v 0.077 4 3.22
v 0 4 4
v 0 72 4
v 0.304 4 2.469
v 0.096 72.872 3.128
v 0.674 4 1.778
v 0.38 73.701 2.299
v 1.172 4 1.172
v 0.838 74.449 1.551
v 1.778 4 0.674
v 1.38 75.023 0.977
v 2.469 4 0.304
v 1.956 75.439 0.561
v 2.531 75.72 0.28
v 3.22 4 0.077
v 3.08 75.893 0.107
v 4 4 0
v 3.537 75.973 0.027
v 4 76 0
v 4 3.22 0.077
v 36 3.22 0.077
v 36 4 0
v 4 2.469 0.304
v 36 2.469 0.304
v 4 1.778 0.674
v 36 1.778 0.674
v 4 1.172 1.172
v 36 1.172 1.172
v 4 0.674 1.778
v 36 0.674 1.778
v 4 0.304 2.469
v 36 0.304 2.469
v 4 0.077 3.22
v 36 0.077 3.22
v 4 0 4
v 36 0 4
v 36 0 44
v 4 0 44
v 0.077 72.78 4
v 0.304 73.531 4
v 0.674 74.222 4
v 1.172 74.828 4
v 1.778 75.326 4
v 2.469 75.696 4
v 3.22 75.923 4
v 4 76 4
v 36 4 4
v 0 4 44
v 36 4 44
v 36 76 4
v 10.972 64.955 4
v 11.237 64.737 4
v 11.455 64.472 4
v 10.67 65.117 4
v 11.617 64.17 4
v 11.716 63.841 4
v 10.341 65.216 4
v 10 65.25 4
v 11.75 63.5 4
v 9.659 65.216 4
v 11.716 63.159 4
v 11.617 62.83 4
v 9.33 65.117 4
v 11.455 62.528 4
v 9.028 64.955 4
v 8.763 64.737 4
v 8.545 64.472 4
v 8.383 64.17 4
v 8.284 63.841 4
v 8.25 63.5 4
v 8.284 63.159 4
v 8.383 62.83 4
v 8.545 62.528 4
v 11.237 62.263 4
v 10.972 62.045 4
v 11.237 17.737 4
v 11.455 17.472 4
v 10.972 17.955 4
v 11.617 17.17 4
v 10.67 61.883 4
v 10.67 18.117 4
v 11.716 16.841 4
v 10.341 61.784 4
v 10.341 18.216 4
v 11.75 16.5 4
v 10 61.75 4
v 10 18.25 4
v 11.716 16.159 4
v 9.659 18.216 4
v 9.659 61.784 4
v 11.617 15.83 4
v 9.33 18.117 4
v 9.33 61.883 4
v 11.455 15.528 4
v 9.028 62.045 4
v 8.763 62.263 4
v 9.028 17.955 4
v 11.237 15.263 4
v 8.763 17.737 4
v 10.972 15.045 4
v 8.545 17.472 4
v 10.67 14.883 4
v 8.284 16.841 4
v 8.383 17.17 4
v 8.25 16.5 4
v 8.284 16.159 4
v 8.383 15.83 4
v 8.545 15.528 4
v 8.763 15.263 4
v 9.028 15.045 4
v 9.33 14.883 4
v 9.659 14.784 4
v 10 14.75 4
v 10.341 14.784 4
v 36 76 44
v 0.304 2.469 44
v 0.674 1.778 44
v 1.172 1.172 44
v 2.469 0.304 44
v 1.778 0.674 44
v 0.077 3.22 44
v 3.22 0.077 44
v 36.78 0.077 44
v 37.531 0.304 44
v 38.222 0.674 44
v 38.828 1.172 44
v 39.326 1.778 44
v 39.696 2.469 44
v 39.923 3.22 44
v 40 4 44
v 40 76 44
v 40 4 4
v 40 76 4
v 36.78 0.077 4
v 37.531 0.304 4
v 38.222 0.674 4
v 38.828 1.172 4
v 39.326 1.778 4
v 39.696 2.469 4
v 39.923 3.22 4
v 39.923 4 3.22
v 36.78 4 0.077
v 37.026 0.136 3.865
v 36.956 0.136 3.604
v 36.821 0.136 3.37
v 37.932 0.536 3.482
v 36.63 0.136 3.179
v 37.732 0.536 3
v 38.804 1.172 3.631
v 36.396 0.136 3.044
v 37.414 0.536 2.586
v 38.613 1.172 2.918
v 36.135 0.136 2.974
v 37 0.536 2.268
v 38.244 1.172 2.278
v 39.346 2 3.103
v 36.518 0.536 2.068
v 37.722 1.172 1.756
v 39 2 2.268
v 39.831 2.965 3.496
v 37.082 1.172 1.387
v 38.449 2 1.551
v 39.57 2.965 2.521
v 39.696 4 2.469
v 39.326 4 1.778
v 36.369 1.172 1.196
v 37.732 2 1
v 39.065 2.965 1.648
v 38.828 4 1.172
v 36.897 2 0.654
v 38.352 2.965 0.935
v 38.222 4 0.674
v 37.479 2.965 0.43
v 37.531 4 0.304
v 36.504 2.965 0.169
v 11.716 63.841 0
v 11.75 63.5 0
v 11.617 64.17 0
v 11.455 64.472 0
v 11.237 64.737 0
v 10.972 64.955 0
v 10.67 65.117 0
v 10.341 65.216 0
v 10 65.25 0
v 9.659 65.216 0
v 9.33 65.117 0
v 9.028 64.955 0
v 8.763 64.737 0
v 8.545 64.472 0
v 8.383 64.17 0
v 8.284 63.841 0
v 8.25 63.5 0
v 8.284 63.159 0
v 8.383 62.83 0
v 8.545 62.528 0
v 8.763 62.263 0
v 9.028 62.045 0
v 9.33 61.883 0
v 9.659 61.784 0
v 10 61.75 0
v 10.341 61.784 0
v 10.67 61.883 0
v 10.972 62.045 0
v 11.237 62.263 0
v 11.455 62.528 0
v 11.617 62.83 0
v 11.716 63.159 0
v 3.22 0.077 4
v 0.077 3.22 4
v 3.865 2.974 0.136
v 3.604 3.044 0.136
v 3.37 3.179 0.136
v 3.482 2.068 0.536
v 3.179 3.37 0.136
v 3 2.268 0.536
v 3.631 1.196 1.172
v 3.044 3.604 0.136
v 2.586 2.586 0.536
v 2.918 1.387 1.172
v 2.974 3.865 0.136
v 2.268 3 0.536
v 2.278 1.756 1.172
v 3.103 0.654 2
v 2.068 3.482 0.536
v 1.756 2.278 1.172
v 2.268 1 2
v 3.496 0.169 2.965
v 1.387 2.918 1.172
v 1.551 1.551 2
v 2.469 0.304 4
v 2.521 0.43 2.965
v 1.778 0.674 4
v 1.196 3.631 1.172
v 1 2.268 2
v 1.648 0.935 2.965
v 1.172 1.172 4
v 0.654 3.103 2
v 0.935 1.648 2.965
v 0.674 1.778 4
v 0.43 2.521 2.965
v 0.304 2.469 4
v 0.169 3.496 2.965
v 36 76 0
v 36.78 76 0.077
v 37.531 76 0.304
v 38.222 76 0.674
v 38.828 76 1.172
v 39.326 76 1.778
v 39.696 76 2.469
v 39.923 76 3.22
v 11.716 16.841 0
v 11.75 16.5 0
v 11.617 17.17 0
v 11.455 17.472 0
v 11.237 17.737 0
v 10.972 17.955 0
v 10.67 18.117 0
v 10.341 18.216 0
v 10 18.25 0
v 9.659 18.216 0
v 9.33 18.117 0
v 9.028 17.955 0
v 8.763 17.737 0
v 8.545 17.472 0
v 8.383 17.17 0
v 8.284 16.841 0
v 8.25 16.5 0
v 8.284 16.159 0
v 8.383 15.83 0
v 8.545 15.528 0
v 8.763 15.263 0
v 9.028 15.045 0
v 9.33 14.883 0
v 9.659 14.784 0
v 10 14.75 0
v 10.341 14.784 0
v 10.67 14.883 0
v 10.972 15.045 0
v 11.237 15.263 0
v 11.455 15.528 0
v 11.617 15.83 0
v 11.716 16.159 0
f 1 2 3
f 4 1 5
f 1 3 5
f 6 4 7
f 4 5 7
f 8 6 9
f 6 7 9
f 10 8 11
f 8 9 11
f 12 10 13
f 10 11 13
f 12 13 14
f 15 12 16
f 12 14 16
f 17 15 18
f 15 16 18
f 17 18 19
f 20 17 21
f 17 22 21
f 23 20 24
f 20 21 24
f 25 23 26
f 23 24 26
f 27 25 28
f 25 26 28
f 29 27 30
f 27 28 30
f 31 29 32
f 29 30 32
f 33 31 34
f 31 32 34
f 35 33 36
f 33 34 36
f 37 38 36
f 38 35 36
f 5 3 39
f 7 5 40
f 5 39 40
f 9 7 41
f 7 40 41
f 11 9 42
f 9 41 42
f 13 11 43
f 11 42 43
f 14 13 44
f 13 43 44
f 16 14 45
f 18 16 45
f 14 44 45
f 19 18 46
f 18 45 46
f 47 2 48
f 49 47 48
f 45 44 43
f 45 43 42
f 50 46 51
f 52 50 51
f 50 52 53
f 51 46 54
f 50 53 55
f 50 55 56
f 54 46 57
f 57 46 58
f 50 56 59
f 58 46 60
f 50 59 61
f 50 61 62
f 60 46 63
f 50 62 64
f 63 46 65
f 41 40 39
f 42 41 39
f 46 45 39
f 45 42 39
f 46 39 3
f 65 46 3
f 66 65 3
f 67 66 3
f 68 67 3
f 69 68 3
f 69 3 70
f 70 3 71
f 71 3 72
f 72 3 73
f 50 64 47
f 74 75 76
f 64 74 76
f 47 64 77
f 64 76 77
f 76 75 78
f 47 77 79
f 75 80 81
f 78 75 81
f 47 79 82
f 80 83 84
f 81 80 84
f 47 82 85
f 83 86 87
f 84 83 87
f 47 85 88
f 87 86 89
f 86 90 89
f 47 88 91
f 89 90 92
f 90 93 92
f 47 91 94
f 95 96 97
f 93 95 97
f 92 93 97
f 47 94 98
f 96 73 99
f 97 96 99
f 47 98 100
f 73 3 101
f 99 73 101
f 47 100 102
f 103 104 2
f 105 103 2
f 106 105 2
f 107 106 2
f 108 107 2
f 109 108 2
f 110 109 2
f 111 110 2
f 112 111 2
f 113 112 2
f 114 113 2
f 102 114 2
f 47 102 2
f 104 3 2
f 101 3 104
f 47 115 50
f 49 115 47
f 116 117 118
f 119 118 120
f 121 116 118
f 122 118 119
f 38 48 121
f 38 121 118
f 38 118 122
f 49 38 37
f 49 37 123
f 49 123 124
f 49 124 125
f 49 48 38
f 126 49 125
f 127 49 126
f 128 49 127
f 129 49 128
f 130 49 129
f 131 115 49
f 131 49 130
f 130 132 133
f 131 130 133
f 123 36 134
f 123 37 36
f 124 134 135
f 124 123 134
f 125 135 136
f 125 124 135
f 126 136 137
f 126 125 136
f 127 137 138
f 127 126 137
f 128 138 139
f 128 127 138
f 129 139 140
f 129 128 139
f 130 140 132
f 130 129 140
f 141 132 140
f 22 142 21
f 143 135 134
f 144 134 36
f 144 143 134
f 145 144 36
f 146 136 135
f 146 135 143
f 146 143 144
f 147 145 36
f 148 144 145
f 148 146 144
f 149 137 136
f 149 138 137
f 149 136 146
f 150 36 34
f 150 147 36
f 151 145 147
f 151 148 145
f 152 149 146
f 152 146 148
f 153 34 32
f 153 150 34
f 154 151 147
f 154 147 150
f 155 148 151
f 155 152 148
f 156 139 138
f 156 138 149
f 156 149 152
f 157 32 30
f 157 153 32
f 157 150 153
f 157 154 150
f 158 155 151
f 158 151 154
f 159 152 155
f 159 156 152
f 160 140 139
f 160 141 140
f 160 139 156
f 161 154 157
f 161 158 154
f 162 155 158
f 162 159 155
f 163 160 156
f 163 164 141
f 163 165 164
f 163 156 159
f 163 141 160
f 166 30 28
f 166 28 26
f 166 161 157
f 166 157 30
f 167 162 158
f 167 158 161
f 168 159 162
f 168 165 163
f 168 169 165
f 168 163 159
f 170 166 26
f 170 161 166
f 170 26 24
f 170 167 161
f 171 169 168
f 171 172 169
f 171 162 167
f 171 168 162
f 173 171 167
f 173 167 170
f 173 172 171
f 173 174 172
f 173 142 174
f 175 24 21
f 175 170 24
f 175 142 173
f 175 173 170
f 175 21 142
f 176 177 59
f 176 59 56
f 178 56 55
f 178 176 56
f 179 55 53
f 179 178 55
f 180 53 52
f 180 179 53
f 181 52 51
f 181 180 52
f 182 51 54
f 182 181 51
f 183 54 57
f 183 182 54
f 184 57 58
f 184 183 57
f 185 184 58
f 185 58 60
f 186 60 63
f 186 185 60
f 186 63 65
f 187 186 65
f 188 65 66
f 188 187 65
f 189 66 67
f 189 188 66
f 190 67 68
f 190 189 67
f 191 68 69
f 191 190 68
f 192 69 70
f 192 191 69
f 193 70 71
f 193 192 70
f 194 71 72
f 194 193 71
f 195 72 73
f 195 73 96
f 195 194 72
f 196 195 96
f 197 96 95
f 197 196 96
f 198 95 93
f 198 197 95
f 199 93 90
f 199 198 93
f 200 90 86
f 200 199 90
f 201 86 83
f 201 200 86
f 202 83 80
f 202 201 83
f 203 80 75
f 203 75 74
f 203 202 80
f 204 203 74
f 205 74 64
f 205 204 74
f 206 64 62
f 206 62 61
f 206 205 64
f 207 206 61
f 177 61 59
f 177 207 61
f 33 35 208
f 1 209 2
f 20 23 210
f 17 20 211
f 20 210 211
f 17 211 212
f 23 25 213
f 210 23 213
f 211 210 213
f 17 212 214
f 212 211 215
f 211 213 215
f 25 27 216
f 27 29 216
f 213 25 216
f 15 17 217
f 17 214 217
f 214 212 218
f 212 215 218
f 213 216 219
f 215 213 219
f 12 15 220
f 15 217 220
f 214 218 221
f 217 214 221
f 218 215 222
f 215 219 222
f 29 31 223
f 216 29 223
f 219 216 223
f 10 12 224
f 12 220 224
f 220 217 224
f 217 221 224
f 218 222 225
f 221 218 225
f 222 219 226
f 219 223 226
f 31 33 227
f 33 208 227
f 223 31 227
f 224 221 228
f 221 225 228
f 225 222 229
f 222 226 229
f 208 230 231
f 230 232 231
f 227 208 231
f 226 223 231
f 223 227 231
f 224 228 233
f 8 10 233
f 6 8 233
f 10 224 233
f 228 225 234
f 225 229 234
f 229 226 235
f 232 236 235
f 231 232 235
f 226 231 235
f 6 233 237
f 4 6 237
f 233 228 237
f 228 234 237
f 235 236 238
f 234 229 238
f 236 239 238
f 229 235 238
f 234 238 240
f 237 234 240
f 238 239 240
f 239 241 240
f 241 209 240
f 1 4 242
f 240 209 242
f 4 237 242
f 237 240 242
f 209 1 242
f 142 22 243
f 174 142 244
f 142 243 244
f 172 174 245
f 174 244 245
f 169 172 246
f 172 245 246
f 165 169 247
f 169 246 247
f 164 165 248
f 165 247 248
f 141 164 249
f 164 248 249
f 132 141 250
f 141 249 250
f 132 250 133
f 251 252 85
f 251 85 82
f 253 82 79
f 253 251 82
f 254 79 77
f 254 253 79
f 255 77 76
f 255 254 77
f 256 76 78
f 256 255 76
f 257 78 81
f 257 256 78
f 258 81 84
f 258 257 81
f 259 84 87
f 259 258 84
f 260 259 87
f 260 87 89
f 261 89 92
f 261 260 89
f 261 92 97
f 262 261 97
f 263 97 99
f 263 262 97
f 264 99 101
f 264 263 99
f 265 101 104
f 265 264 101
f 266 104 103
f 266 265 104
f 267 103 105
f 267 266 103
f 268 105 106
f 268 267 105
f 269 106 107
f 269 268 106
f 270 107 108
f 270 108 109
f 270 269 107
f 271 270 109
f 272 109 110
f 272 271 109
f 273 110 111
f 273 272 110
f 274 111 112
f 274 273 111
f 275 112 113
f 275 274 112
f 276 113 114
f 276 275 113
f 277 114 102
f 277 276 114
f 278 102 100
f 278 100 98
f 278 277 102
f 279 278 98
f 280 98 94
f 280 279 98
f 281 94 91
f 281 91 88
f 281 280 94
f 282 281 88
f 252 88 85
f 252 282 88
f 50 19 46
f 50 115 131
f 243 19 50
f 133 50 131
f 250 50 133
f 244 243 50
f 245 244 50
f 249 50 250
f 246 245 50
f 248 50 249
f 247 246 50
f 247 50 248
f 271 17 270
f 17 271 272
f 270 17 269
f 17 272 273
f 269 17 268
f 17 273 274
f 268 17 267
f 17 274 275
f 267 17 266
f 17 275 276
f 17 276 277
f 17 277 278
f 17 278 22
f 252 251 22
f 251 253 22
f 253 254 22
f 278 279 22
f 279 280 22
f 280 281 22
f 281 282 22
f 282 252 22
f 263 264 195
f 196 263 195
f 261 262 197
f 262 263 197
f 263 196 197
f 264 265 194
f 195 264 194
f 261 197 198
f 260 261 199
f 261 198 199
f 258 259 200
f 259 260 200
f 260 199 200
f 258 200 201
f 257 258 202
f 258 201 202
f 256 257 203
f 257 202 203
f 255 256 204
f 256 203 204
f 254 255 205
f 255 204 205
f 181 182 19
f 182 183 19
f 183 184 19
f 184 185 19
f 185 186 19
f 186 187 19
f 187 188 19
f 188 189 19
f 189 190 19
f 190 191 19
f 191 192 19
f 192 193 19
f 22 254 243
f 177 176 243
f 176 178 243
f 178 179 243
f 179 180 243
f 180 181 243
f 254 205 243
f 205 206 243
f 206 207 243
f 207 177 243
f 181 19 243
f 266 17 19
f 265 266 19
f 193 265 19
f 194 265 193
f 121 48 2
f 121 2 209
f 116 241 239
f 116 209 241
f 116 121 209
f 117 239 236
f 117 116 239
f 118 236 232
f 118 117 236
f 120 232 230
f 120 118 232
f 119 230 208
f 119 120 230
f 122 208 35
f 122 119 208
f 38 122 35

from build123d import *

# Parameters (mm, degrees)
F0_W     = 40
F0_H     = 76
F0_R     = 1.75
F1_DEPTH = 44
F2_W     = 72
F2_H     = 40
F3_DEPTH = 36
F4_R     = 1.5
F5_DEPTH = 4
F6_DEPTH = 4
F7_R     = 3.99999


# Not quite as in the source:
# - a fillet or chamfer is up to 0.001 mm smaller than in the source, because OpenCascade refuses the exact size


with BuildPart() as f1:
    # F0 (on Top) → F1 (new body)
    with BuildSketch(Plane.XY):
        with Locations((20, 38)):
            Rectangle(F0_W, F0_H)
        with Locations((10, 16.5)):
            Circle(F0_R, mode=Mode.SUBTRACT)
        with Locations((10, 63.5)):
            Circle(F0_R, mode=Mode.SUBTRACT)
        with Locations((10, 63.5)):
            Circle(F0_R)
        with Locations((10, 16.5)):
            Circle(F0_R)
    extrude(amount=F1_DEPTH)

    # F2 (on face) → F3 (cut)
    with BuildSketch(Plane(origin=(0, 0, 0), x_dir=(0, -1, 0), z_dir=(-1, 0, 0))):
        with Locations((-40, 24)):
            Rectangle(F2_W, F2_H)
    extrude(amount=-F3_DEPTH, mode=Mode.SUBTRACT)

    # F4 (on face) → F5 (cut)
    with BuildSketch(Plane(origin=(0, 76, 0), x_dir=(-1, 0, 0), z_dir=(0, 1, 0))):
        with BuildLine():
            ThreePointArc((-29.5, 18.5), (-26.6715728753, 19.6715728753), (-25.5, 22.5))
            ThreePointArc((-25.5, 22.5), (-26.6715728753, 25.3284271247), (-29.5, 26.5))
            ThreePointArc((-29.5, 26.5), (-33.5, 22.5), (-29.5, 18.5))
        make_face()
        with Locations((-12, 23.5)):
            Circle(F4_R)
    extrude(amount=-F5_DEPTH, mode=Mode.SUBTRACT)

    # F0 (on Top) → F6 (cut)
    with BuildSketch(Plane.XY):
        with Locations((10, 63.5)):
            Circle(F0_R)
        with Locations((10, 16.5)):
            Circle(F0_R)
    extrude(amount=F6_DEPTH, mode=Mode.SUBTRACT)

    # F7 (radius 4 in the source; OpenCascade refuses exactly that, so slightly less here)
    f7_edges = [f1.edges().sort_by_distance(p)[0] for p in [
        (40, 38, 0),
        (40, 0, 22),
        (0, 0, 22),
        (20, 0, 0),
        (0, 76, 2),
        (0, 38, 0),
    ]]
    fillet(f7_edges, radius=F7_R)


solid = f1.part
